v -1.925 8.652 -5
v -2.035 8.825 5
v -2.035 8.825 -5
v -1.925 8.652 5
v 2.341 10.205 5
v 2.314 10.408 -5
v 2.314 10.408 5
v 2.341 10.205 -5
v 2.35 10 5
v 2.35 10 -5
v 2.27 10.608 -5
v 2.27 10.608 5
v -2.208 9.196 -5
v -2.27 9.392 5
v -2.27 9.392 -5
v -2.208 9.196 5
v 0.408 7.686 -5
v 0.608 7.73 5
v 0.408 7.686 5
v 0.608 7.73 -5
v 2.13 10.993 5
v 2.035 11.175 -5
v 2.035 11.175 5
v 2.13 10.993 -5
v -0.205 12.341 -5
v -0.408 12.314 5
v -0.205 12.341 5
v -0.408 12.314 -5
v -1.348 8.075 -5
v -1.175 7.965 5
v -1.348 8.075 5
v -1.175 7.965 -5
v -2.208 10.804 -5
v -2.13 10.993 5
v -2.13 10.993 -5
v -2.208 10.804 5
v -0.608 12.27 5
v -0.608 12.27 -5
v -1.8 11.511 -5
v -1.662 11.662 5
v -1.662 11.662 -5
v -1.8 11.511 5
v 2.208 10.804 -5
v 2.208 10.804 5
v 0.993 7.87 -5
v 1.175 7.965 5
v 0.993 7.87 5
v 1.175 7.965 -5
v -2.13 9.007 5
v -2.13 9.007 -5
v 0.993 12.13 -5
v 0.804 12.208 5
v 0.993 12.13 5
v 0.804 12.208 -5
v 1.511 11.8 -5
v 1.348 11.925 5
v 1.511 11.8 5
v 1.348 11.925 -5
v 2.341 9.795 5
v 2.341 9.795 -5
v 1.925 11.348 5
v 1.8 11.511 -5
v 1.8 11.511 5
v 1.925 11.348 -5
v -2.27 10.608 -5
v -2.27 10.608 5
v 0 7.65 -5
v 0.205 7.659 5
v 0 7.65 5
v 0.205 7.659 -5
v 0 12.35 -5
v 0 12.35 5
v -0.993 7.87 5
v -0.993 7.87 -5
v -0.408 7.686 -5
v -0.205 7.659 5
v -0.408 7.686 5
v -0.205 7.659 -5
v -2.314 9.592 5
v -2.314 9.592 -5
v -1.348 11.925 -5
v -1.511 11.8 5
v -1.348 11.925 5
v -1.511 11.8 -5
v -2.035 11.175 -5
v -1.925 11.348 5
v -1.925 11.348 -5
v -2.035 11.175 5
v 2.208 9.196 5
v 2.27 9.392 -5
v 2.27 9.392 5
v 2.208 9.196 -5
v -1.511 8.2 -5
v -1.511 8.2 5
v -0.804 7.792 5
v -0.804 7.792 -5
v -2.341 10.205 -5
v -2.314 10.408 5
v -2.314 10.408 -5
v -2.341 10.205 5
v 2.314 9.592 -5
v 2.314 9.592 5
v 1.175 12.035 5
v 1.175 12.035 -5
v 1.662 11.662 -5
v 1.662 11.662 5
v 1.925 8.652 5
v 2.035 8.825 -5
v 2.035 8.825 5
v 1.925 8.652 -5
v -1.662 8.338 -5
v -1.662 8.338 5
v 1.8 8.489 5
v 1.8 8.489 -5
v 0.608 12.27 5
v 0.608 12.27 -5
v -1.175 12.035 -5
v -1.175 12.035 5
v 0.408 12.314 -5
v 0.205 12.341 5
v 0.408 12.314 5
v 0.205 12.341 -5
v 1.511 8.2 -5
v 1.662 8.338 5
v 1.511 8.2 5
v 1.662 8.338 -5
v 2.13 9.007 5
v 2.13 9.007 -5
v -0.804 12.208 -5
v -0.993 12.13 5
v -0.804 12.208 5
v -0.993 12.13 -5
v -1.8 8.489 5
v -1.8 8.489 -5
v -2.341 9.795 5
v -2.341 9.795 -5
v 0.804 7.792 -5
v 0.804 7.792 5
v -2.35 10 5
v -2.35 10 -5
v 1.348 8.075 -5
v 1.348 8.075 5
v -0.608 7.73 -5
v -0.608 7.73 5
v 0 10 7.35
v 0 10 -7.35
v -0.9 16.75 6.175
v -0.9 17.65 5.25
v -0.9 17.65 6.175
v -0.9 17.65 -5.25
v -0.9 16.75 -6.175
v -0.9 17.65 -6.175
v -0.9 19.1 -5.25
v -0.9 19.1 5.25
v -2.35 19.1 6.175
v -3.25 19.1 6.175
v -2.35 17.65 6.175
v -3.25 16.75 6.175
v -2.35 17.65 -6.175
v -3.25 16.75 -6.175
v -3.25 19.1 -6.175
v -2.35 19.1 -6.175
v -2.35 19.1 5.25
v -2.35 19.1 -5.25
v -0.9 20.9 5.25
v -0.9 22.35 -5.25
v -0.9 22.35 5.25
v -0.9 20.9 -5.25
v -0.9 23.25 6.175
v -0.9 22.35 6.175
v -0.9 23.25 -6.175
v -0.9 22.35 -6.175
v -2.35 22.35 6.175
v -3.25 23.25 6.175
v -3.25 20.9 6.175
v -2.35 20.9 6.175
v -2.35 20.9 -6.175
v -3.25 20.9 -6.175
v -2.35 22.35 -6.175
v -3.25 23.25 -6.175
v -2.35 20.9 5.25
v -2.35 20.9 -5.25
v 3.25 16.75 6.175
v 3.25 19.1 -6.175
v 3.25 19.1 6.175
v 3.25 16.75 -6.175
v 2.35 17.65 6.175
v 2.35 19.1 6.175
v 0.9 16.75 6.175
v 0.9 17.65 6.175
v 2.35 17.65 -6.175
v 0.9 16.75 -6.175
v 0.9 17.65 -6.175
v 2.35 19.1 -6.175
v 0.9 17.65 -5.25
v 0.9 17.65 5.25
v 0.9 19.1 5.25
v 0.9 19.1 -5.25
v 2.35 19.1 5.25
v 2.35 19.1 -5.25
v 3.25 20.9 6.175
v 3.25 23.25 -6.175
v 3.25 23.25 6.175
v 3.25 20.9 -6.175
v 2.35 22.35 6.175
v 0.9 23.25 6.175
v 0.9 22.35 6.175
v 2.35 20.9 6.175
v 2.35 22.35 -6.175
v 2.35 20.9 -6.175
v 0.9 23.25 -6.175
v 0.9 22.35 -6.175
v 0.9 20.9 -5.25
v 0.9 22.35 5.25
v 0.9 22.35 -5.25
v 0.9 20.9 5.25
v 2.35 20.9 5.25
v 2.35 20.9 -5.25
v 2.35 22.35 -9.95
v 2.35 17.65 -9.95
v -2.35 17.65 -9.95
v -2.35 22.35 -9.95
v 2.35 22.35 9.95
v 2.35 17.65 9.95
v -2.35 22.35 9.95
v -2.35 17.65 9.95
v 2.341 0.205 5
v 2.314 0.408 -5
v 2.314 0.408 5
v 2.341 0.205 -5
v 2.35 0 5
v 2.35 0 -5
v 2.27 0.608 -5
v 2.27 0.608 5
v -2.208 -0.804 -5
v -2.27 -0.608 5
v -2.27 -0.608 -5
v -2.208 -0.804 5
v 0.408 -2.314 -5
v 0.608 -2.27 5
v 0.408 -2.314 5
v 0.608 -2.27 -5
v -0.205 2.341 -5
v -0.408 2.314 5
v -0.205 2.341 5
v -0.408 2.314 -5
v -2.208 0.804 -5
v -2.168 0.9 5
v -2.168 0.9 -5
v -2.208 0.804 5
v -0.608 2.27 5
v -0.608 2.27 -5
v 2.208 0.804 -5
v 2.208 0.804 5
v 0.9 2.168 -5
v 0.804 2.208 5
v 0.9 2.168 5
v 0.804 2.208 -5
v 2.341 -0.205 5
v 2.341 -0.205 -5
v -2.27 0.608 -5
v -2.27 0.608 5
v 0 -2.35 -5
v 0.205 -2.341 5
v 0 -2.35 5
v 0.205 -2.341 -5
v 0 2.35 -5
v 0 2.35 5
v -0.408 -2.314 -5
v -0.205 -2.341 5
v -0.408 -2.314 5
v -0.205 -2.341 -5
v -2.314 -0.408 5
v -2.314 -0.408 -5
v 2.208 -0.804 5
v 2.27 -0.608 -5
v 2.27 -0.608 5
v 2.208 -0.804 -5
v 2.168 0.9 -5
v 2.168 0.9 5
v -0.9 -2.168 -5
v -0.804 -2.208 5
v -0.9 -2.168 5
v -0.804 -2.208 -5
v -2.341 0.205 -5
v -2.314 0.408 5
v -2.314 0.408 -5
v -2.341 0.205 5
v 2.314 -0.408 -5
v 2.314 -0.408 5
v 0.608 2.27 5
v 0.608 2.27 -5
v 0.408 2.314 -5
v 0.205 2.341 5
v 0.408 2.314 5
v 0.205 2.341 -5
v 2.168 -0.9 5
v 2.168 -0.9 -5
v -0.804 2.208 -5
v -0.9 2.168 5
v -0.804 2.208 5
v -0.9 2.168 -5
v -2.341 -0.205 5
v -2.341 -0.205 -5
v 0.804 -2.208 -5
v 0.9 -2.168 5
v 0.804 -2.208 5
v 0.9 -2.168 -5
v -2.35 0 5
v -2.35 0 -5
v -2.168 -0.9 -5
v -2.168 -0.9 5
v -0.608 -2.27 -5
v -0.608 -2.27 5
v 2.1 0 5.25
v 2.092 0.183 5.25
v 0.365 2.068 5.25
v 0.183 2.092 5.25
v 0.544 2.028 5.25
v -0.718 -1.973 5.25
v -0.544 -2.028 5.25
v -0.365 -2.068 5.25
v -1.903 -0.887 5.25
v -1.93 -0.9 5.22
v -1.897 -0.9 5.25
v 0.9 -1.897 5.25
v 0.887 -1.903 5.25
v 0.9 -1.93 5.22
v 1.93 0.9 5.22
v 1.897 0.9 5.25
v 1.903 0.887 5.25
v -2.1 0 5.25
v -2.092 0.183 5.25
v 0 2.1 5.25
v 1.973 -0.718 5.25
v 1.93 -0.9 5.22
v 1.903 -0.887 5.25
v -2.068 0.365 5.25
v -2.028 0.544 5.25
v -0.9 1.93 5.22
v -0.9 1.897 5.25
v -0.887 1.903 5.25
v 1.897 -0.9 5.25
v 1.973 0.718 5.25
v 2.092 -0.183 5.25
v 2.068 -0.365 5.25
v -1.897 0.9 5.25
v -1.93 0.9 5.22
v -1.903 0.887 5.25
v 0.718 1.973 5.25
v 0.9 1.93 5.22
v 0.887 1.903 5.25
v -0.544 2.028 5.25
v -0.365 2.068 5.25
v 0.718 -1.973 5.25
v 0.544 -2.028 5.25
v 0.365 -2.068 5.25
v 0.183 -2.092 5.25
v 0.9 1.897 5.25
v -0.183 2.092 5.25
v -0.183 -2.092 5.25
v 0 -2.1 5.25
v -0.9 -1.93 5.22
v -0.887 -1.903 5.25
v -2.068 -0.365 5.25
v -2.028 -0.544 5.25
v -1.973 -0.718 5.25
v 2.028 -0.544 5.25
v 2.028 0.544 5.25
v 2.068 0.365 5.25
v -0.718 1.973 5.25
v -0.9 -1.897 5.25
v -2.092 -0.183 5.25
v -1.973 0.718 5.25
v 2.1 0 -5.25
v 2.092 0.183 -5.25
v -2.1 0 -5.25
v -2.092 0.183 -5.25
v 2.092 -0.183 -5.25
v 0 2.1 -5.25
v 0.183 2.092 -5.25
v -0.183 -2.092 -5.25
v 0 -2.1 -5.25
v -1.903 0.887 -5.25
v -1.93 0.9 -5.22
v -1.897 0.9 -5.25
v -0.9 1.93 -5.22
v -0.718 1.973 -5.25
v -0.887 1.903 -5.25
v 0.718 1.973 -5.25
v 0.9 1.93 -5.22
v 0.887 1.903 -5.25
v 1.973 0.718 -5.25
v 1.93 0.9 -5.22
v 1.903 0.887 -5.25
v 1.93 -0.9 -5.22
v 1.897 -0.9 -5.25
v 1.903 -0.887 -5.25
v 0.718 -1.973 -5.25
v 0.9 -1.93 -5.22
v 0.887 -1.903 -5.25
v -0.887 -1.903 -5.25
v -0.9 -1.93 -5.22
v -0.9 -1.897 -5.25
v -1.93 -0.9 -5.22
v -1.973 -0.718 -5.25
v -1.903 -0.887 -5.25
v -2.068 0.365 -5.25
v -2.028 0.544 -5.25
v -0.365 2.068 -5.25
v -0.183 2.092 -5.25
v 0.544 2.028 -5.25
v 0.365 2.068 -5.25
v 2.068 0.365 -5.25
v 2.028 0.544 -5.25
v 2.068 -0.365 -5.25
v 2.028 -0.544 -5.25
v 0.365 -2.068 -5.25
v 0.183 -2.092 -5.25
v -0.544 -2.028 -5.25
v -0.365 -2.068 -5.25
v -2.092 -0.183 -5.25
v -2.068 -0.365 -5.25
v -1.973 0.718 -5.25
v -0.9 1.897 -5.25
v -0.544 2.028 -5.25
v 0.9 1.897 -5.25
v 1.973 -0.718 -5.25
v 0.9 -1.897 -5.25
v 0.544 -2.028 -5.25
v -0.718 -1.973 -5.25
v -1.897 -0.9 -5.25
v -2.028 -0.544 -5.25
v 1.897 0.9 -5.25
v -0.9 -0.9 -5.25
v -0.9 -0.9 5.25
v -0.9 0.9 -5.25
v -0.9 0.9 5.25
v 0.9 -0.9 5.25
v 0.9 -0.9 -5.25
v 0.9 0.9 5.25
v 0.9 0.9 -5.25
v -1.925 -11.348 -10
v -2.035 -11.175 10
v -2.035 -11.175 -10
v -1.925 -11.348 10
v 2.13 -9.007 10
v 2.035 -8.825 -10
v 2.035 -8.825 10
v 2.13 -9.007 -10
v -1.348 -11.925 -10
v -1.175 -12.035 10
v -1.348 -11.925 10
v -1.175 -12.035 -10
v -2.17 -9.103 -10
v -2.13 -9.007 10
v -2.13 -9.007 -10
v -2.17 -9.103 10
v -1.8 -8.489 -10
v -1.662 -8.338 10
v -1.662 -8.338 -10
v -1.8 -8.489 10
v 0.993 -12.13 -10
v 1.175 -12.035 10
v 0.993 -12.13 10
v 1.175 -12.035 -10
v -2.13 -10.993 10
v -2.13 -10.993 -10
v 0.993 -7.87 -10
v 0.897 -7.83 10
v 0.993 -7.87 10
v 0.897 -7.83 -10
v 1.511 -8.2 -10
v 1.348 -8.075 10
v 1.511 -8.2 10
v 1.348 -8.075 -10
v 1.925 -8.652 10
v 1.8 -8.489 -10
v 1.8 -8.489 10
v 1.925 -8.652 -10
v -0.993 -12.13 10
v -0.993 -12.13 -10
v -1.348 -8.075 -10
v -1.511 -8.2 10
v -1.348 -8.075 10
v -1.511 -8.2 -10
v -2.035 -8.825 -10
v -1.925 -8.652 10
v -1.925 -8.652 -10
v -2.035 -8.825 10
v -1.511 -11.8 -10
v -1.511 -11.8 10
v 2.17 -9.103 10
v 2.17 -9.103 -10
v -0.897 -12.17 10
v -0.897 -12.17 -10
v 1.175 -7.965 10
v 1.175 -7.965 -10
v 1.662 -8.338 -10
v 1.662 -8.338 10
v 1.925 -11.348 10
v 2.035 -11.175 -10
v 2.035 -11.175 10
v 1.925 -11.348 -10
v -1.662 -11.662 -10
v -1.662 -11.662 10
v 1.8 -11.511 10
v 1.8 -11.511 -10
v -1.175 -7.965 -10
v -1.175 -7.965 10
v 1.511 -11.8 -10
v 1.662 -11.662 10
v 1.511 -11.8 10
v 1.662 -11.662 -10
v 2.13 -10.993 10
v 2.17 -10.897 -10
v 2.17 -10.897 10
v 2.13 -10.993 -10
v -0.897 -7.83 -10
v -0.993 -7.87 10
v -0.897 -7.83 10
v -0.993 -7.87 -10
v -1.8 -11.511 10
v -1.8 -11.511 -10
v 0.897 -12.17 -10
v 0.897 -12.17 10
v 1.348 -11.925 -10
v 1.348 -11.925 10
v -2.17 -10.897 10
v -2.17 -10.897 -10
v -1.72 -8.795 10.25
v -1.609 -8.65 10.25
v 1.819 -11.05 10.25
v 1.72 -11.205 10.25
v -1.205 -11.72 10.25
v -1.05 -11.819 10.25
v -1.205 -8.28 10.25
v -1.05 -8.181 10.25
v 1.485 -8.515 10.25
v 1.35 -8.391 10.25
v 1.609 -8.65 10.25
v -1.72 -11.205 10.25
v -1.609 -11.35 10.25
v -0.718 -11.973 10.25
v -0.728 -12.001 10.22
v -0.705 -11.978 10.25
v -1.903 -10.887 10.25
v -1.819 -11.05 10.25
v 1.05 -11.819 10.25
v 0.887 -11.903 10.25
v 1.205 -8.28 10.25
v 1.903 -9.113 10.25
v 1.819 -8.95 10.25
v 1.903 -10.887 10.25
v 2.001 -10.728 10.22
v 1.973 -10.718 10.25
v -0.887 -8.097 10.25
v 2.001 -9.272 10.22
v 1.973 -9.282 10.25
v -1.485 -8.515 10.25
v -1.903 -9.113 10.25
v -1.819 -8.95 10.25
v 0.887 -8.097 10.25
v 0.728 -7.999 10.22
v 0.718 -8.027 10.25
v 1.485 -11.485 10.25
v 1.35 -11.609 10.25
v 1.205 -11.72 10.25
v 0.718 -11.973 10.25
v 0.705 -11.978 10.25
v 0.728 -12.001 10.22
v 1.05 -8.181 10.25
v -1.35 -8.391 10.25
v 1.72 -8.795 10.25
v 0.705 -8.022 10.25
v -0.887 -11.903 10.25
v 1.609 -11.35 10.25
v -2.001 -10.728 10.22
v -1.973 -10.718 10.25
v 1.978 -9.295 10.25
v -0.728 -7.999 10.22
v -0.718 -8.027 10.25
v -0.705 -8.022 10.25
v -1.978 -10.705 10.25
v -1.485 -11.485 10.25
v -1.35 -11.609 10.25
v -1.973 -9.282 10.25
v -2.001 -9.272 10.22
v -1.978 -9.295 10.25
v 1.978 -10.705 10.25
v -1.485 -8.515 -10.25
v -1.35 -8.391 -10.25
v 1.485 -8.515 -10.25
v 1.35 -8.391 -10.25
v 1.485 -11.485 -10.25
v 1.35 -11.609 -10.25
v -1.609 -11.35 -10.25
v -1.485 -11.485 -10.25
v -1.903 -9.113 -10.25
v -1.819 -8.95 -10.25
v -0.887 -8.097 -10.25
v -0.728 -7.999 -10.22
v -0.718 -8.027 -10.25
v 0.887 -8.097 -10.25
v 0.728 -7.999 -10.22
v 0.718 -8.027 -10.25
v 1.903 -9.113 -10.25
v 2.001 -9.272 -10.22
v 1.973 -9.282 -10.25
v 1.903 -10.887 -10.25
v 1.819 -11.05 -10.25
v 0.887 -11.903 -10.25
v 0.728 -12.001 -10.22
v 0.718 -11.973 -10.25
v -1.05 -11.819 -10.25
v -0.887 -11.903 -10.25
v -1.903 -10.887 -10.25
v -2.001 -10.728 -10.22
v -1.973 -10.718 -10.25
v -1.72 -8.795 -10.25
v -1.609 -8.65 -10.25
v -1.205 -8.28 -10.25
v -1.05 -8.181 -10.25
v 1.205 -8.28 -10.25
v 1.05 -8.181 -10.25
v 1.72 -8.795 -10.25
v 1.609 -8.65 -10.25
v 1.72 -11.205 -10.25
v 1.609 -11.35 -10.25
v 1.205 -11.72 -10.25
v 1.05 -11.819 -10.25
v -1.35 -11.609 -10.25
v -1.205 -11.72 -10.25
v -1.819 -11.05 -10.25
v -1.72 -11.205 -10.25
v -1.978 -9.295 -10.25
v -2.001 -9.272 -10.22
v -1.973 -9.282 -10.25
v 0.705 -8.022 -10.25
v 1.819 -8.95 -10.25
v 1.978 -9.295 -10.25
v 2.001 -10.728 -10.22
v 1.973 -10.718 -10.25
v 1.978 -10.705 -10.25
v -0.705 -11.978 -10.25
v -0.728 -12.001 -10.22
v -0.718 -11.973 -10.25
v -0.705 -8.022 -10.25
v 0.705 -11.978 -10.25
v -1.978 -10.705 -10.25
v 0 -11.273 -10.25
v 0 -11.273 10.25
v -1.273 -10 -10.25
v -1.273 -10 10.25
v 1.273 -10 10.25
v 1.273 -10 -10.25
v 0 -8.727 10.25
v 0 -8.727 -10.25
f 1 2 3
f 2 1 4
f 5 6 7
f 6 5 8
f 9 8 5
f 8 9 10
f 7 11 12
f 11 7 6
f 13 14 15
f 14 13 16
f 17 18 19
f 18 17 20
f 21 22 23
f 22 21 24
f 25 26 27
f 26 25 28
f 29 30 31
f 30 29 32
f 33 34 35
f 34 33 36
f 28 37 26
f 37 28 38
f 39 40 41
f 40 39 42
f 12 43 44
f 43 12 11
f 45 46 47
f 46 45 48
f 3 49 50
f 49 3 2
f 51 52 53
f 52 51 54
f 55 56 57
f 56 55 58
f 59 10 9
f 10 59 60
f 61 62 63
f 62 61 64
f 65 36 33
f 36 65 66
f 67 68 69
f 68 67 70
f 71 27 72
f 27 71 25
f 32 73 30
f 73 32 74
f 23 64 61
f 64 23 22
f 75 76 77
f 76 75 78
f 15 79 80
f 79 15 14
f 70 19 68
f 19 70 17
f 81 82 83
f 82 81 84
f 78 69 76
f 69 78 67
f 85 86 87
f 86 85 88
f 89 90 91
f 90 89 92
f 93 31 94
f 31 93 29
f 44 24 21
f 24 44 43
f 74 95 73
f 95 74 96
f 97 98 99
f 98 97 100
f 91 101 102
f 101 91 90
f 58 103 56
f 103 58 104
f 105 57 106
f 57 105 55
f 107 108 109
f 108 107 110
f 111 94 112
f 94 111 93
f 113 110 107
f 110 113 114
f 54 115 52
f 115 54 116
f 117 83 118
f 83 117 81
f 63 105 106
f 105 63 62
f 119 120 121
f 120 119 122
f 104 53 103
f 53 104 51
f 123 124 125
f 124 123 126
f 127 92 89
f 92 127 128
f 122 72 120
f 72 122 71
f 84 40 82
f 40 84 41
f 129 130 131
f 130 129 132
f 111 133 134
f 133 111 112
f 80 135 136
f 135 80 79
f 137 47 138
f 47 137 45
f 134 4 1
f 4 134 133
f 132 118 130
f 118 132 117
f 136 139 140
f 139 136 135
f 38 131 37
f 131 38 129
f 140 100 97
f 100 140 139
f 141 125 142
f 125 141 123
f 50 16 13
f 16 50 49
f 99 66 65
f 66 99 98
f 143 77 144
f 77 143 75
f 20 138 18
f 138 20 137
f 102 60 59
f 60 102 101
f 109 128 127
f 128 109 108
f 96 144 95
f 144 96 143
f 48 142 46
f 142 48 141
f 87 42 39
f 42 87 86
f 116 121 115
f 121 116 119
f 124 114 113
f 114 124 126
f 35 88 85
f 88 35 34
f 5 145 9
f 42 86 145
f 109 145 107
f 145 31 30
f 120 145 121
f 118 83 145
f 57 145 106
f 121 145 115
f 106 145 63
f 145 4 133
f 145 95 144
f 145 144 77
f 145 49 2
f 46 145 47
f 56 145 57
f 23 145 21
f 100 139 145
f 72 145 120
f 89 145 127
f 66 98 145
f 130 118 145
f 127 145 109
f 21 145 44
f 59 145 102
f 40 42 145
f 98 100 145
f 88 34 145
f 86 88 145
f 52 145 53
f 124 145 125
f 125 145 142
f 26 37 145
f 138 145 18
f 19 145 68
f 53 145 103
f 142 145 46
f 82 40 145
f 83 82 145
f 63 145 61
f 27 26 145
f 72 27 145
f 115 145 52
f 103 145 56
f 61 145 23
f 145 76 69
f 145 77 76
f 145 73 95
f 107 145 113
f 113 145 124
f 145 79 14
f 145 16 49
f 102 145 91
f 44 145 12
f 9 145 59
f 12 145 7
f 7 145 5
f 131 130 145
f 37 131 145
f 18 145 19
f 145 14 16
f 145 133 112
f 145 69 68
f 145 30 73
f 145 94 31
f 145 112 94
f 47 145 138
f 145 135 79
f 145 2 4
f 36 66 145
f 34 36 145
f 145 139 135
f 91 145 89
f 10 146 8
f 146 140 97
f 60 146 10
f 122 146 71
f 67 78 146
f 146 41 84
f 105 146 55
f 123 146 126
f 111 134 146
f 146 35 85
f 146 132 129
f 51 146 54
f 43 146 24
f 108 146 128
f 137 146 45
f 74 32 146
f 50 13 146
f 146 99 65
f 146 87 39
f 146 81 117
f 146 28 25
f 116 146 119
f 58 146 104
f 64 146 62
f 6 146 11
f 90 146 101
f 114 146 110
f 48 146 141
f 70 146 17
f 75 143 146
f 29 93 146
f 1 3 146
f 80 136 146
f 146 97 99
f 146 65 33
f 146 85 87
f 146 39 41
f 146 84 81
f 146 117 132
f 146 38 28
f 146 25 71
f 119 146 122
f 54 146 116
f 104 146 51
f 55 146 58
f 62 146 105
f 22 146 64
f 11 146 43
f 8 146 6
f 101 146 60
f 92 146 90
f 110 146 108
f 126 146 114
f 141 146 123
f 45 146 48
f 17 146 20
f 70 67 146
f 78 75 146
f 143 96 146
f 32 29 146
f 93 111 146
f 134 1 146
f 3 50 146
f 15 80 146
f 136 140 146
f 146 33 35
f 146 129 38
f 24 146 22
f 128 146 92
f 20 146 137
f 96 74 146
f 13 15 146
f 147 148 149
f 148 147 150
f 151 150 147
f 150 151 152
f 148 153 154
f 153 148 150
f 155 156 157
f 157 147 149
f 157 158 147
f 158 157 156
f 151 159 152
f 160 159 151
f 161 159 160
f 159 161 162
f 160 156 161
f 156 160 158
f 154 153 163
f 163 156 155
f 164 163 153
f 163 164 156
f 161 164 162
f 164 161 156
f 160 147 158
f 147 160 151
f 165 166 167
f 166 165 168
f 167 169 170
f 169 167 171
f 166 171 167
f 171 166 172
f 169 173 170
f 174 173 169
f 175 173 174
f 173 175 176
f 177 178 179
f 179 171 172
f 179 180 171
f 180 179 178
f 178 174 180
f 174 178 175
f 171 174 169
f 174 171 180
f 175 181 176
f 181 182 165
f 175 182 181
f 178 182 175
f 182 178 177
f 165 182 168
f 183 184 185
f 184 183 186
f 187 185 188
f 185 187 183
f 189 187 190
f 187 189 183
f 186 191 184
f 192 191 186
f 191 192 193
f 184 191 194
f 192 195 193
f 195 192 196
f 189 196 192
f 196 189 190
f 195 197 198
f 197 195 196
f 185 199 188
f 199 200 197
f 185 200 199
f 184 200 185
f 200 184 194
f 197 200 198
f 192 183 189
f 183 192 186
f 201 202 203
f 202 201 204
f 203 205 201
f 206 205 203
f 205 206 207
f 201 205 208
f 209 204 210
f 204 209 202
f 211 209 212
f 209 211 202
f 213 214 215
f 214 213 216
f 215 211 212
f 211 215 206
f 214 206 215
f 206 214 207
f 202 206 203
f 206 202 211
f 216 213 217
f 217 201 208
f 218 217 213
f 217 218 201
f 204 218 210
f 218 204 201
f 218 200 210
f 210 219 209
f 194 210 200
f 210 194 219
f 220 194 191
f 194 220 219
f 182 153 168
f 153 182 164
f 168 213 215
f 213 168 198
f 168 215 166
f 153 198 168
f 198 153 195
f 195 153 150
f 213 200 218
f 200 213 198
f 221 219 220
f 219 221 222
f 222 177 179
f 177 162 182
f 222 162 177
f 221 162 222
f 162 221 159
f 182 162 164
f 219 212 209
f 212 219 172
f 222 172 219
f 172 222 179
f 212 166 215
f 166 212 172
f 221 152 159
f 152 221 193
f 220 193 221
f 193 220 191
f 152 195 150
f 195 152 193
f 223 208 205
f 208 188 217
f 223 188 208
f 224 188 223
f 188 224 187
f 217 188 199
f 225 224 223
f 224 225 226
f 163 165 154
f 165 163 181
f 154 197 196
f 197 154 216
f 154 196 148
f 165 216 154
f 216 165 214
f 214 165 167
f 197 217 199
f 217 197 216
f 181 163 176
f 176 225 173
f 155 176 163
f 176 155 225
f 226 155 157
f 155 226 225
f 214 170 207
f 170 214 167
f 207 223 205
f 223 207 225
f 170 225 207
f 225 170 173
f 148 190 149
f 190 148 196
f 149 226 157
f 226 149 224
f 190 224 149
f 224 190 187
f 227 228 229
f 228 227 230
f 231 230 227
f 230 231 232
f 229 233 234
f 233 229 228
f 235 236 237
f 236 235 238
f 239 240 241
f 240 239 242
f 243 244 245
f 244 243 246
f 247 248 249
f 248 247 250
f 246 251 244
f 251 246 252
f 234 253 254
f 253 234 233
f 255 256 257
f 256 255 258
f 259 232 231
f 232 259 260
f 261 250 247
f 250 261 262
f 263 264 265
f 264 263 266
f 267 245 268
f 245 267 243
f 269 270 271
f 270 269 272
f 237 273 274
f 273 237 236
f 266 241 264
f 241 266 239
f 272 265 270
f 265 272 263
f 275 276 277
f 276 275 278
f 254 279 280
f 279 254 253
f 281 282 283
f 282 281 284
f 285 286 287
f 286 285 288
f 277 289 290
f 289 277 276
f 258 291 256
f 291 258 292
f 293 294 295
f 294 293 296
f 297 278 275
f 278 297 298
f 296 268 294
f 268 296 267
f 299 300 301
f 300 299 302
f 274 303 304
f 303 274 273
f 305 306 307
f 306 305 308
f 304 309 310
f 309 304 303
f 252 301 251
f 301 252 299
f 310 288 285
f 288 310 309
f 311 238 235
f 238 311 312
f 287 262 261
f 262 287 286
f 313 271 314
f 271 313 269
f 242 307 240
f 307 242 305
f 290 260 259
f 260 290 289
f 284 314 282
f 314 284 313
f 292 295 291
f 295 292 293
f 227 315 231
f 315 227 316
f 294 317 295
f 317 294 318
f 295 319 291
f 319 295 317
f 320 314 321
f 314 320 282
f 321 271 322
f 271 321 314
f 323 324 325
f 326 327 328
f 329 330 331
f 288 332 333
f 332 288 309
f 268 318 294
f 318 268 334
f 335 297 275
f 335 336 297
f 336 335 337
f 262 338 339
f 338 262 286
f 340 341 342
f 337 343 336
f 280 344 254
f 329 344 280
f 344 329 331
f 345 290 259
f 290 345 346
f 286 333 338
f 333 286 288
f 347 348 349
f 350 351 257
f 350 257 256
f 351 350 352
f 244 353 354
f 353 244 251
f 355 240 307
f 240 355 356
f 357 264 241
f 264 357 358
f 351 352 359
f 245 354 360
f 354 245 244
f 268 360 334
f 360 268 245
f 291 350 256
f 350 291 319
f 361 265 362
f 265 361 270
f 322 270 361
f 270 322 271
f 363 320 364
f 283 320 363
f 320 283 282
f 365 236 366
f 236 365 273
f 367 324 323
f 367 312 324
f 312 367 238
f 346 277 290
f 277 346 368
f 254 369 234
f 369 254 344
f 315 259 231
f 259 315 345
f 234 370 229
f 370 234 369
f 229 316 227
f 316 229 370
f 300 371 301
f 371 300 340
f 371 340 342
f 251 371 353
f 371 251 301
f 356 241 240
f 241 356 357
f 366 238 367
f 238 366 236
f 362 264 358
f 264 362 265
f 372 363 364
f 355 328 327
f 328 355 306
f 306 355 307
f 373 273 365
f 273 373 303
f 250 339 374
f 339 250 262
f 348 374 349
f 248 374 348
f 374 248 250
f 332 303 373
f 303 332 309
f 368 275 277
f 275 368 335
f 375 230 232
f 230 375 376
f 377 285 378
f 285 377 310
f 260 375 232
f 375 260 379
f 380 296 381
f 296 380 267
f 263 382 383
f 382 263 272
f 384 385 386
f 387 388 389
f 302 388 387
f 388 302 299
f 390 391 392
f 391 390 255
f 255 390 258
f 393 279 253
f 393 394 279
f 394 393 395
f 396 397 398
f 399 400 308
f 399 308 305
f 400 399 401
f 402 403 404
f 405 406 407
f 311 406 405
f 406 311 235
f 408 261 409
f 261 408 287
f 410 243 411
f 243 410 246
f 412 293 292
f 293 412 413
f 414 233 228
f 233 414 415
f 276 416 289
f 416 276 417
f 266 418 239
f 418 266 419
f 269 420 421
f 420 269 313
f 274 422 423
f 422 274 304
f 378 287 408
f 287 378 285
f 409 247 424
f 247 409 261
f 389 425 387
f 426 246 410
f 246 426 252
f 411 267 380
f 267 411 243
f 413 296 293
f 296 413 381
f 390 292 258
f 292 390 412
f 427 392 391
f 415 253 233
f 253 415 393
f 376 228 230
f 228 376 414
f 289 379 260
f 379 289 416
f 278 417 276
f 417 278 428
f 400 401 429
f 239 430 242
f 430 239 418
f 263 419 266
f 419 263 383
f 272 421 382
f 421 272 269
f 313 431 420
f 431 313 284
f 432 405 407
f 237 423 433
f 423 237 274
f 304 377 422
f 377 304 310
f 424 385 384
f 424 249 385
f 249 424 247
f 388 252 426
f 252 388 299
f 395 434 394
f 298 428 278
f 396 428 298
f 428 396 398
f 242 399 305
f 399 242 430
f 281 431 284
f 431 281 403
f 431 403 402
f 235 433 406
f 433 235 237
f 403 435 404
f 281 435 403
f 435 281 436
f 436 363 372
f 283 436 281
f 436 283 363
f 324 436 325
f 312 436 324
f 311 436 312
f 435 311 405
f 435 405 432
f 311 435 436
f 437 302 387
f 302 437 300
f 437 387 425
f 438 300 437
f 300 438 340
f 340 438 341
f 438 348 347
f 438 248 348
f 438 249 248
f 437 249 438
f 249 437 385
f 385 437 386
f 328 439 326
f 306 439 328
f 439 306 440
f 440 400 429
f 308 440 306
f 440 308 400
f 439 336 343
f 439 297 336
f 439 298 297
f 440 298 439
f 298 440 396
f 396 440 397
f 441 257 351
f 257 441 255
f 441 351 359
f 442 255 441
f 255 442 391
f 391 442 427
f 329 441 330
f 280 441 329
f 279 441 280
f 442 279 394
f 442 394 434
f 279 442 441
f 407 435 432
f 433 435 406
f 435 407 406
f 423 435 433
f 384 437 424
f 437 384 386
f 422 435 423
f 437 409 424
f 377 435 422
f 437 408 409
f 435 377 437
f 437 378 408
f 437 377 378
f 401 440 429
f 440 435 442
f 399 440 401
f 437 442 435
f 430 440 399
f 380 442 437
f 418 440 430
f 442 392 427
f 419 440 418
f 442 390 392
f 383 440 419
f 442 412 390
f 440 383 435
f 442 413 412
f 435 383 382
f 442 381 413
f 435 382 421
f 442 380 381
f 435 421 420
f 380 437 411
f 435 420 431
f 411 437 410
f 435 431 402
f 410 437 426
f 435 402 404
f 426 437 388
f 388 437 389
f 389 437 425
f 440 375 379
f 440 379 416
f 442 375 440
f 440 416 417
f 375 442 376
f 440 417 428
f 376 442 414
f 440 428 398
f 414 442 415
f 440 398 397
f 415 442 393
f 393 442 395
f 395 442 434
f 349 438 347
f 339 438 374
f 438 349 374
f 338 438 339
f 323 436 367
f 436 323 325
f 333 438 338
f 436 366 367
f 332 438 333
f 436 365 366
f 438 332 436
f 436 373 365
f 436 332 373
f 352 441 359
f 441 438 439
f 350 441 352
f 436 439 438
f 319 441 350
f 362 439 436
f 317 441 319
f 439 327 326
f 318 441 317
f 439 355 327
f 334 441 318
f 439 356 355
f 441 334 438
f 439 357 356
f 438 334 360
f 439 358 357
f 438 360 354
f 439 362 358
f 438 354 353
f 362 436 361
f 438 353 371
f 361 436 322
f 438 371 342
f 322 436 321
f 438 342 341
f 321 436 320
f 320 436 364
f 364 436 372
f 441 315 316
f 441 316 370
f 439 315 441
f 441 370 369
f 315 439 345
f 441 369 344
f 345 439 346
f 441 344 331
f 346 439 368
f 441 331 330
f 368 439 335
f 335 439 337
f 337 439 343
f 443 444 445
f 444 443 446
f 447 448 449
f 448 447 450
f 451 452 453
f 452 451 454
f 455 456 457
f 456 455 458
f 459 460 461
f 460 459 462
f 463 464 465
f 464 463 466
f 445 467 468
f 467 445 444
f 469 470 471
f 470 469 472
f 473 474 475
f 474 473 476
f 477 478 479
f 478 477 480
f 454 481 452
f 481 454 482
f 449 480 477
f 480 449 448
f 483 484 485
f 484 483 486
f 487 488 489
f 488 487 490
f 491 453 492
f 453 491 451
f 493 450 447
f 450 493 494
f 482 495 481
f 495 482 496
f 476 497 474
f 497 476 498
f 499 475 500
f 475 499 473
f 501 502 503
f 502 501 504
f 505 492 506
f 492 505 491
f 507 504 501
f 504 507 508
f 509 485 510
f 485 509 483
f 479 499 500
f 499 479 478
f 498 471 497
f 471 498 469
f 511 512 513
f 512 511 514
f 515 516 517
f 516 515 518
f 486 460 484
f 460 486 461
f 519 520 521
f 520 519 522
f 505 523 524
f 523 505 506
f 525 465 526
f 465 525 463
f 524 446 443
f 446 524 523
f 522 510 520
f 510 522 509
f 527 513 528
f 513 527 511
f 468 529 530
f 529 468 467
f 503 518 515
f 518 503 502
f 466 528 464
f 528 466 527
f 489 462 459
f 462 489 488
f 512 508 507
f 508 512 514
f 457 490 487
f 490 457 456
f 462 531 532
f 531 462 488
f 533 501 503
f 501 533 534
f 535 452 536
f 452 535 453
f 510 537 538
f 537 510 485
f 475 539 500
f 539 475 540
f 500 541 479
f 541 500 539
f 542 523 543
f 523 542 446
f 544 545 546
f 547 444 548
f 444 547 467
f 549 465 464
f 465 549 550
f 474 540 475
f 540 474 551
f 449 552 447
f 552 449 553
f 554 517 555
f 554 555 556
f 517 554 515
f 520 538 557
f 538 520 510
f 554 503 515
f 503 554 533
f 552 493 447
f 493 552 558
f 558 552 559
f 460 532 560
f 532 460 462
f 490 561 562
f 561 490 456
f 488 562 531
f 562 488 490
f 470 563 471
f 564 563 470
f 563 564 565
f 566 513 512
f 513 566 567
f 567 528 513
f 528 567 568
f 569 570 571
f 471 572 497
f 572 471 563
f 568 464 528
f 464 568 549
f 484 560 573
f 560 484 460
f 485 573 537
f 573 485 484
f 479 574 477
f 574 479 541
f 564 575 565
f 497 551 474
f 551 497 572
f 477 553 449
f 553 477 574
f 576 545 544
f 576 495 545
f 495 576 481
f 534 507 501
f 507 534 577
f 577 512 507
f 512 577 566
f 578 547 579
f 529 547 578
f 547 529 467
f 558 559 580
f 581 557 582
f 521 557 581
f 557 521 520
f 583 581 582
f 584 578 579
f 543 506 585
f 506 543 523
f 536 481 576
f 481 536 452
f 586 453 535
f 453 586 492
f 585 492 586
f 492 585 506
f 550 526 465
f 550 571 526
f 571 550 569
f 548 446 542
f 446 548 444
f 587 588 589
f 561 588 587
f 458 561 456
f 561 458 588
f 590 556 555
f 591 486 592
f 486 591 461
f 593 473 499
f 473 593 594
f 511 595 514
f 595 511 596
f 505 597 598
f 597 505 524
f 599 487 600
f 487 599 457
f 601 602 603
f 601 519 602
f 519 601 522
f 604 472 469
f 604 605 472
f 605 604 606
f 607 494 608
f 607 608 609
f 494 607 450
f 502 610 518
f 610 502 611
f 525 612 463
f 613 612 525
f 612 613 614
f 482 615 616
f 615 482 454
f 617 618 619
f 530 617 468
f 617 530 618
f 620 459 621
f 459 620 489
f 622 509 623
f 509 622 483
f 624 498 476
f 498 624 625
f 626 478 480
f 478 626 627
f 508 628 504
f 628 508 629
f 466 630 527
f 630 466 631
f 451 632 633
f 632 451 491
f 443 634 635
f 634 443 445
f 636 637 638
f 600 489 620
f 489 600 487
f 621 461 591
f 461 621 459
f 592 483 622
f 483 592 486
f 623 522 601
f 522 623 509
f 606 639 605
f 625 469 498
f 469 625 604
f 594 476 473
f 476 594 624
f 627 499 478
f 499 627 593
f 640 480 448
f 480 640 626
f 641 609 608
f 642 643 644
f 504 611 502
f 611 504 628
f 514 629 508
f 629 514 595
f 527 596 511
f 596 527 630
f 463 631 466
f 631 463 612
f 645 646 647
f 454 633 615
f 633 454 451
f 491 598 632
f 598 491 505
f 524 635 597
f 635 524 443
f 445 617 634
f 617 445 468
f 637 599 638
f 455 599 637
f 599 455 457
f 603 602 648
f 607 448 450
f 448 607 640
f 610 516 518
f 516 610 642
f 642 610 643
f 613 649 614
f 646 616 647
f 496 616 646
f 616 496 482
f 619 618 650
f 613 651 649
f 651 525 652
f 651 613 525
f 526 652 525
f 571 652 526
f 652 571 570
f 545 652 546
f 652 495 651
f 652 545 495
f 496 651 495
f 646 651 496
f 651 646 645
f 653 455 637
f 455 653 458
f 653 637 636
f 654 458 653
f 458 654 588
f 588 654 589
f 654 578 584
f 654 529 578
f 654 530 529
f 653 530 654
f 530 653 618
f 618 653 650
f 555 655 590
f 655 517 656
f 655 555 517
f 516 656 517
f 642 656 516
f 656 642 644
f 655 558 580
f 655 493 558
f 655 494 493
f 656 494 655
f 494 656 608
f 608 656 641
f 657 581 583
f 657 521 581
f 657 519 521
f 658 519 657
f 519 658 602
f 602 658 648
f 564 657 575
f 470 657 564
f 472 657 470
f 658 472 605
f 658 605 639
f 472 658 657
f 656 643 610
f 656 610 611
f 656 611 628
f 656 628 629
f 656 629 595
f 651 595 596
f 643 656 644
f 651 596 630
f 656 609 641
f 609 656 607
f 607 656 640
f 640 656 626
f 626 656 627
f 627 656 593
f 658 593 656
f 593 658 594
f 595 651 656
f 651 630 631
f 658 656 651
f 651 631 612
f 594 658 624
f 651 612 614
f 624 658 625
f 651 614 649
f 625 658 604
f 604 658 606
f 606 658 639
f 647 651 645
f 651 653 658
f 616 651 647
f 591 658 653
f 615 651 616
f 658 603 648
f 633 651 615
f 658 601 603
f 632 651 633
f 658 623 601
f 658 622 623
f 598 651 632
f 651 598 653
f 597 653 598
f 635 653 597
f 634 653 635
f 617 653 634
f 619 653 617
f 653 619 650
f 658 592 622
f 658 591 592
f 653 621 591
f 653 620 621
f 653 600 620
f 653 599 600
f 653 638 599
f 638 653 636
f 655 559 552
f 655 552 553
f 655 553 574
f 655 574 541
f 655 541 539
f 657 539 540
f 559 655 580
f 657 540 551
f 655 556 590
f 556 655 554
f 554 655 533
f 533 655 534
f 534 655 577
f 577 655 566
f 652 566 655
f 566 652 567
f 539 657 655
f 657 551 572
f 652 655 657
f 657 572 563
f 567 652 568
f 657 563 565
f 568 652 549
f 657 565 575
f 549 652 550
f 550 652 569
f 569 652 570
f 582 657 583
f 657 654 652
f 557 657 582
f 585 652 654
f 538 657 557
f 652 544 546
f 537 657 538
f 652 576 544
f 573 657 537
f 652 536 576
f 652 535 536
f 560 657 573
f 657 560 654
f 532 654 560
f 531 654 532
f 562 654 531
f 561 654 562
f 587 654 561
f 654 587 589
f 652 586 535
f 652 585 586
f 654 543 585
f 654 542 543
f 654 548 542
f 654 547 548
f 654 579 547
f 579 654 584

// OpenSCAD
// file: ../../globals/ObtGlobalConst.scad
// Global resolution
$fs = 0.1;	// Don't generate smaller facets than 0.1 mm
$fa = 5;		// Don't generate larger angles than 5 degrees

// Brick dimensions
OBT_GLOBAL_BAR_WIDTH = 7.2;
OBT_GLOBAL_BAR_HEIGHT = 7.6;
OBT_GLOBAL_BAR_INNER_WIDTH = 5.4;
OBT_GLOBAL_BAR_WEB_WIDTH = OBT_GLOBAL_BAR_HEIGHT - 7.0;

OBT_GLOBAL_HOLE_DIAMETER = 4.8;
//OBT_GLOBAL_HOLE_DIAMETER_OUTER = 6.7;
OBT_GLOBAL_HOLE_DIAMETER_OUTER = OBT_GLOBAL_BAR_WIDTH;
OBT_GLOBAL_HOLE_CHAMFER_DIAMETER = 6.2;
OBT_GLOBAL_HOLE_CHAMFER_HEIGHT = 0.7;

OBT_GLOBAL_HOLE_DISTANCE = 12.9 - OBT_GLOBAL_HOLE_DIAMETER;
// file: ObtAxlConst.scad
include <../../globals/ObtGlobalConst.scad>

// Axles dimensions
OBT_AXL_DIAMETER = 4.7;
OBT_AXL_BASE_LENGTH = 10;
// main file
include <ObtAxlConst.scad>

module obtAxlStdBase(length){
	union(){
		coneHeight = 0.5 * OBT_AXL_DIAMETER;
		coneOffset = 0.5 * (length * OBT_AXL_BASE_LENGTH + coneHeight);
		cylinder(length * OBT_AXL_BASE_LENGTH, d1 = OBT_AXL_DIAMETER, d2 = OBT_AXL_DIAMETER, center = true);
		translate([0, 0, +coneOffset]) cylinder(coneHeight, d1 = OBT_AXL_DIAMETER, d2 = 0, center = true);
		translate([0, 0, -coneOffset]) cylinder(coneHeight, d1 = 0, d2 = OBT_AXL_DIAMETER, center = true);
	}
}

module obtAxlStdDiff(length){
	cubeWidth = 0.5 * OBT_AXL_DIAMETER;
	crossWidth = 1.8;
	crossOffset = 1 * (cubeWidth + crossWidth);
	offsetChamferCube = length * OBT_AXL_BASE_LENGTH + 1 * OBT_AXL_DIAMETER + 0.5;
	for(i = [0 : 1 : 1]){
		for(j = [0 : 1 : 1])
			translate([crossOffset * (i - 0.5) , crossOffset * (j - 0.5), 0]) cube([cubeWidth, cubeWidth, length * (OBT_AXL_BASE_LENGTH + 0.5 * OBT_AXL_DIAMETER)] , center = true);
		translate([0, 0, offsetChamferCube * (i - 0.5)]) cube(OBT_AXL_DIAMETER, center = true);
	}
}

module obtAxlStd(length = 1, color = "lightgrey", rotation = 0){
	color(color)
		difference(){
			obtAxlStdBase(length);
			rotate([0, 0, rotation]) obtAxlStdDiff(length);
		}
}


// Test
length = 1;
translate([0,  10, 0]) color("green") obtAxlStdBase(length);
translate([0,  20, 0]) color("red") obtAxlStdDiff(length);
translate([0,   0, 0]) obtAxlStd(length);
translate([0, -10, 0]) obtAxlStd(length = 2, color = "khaki", rotation = 45);
